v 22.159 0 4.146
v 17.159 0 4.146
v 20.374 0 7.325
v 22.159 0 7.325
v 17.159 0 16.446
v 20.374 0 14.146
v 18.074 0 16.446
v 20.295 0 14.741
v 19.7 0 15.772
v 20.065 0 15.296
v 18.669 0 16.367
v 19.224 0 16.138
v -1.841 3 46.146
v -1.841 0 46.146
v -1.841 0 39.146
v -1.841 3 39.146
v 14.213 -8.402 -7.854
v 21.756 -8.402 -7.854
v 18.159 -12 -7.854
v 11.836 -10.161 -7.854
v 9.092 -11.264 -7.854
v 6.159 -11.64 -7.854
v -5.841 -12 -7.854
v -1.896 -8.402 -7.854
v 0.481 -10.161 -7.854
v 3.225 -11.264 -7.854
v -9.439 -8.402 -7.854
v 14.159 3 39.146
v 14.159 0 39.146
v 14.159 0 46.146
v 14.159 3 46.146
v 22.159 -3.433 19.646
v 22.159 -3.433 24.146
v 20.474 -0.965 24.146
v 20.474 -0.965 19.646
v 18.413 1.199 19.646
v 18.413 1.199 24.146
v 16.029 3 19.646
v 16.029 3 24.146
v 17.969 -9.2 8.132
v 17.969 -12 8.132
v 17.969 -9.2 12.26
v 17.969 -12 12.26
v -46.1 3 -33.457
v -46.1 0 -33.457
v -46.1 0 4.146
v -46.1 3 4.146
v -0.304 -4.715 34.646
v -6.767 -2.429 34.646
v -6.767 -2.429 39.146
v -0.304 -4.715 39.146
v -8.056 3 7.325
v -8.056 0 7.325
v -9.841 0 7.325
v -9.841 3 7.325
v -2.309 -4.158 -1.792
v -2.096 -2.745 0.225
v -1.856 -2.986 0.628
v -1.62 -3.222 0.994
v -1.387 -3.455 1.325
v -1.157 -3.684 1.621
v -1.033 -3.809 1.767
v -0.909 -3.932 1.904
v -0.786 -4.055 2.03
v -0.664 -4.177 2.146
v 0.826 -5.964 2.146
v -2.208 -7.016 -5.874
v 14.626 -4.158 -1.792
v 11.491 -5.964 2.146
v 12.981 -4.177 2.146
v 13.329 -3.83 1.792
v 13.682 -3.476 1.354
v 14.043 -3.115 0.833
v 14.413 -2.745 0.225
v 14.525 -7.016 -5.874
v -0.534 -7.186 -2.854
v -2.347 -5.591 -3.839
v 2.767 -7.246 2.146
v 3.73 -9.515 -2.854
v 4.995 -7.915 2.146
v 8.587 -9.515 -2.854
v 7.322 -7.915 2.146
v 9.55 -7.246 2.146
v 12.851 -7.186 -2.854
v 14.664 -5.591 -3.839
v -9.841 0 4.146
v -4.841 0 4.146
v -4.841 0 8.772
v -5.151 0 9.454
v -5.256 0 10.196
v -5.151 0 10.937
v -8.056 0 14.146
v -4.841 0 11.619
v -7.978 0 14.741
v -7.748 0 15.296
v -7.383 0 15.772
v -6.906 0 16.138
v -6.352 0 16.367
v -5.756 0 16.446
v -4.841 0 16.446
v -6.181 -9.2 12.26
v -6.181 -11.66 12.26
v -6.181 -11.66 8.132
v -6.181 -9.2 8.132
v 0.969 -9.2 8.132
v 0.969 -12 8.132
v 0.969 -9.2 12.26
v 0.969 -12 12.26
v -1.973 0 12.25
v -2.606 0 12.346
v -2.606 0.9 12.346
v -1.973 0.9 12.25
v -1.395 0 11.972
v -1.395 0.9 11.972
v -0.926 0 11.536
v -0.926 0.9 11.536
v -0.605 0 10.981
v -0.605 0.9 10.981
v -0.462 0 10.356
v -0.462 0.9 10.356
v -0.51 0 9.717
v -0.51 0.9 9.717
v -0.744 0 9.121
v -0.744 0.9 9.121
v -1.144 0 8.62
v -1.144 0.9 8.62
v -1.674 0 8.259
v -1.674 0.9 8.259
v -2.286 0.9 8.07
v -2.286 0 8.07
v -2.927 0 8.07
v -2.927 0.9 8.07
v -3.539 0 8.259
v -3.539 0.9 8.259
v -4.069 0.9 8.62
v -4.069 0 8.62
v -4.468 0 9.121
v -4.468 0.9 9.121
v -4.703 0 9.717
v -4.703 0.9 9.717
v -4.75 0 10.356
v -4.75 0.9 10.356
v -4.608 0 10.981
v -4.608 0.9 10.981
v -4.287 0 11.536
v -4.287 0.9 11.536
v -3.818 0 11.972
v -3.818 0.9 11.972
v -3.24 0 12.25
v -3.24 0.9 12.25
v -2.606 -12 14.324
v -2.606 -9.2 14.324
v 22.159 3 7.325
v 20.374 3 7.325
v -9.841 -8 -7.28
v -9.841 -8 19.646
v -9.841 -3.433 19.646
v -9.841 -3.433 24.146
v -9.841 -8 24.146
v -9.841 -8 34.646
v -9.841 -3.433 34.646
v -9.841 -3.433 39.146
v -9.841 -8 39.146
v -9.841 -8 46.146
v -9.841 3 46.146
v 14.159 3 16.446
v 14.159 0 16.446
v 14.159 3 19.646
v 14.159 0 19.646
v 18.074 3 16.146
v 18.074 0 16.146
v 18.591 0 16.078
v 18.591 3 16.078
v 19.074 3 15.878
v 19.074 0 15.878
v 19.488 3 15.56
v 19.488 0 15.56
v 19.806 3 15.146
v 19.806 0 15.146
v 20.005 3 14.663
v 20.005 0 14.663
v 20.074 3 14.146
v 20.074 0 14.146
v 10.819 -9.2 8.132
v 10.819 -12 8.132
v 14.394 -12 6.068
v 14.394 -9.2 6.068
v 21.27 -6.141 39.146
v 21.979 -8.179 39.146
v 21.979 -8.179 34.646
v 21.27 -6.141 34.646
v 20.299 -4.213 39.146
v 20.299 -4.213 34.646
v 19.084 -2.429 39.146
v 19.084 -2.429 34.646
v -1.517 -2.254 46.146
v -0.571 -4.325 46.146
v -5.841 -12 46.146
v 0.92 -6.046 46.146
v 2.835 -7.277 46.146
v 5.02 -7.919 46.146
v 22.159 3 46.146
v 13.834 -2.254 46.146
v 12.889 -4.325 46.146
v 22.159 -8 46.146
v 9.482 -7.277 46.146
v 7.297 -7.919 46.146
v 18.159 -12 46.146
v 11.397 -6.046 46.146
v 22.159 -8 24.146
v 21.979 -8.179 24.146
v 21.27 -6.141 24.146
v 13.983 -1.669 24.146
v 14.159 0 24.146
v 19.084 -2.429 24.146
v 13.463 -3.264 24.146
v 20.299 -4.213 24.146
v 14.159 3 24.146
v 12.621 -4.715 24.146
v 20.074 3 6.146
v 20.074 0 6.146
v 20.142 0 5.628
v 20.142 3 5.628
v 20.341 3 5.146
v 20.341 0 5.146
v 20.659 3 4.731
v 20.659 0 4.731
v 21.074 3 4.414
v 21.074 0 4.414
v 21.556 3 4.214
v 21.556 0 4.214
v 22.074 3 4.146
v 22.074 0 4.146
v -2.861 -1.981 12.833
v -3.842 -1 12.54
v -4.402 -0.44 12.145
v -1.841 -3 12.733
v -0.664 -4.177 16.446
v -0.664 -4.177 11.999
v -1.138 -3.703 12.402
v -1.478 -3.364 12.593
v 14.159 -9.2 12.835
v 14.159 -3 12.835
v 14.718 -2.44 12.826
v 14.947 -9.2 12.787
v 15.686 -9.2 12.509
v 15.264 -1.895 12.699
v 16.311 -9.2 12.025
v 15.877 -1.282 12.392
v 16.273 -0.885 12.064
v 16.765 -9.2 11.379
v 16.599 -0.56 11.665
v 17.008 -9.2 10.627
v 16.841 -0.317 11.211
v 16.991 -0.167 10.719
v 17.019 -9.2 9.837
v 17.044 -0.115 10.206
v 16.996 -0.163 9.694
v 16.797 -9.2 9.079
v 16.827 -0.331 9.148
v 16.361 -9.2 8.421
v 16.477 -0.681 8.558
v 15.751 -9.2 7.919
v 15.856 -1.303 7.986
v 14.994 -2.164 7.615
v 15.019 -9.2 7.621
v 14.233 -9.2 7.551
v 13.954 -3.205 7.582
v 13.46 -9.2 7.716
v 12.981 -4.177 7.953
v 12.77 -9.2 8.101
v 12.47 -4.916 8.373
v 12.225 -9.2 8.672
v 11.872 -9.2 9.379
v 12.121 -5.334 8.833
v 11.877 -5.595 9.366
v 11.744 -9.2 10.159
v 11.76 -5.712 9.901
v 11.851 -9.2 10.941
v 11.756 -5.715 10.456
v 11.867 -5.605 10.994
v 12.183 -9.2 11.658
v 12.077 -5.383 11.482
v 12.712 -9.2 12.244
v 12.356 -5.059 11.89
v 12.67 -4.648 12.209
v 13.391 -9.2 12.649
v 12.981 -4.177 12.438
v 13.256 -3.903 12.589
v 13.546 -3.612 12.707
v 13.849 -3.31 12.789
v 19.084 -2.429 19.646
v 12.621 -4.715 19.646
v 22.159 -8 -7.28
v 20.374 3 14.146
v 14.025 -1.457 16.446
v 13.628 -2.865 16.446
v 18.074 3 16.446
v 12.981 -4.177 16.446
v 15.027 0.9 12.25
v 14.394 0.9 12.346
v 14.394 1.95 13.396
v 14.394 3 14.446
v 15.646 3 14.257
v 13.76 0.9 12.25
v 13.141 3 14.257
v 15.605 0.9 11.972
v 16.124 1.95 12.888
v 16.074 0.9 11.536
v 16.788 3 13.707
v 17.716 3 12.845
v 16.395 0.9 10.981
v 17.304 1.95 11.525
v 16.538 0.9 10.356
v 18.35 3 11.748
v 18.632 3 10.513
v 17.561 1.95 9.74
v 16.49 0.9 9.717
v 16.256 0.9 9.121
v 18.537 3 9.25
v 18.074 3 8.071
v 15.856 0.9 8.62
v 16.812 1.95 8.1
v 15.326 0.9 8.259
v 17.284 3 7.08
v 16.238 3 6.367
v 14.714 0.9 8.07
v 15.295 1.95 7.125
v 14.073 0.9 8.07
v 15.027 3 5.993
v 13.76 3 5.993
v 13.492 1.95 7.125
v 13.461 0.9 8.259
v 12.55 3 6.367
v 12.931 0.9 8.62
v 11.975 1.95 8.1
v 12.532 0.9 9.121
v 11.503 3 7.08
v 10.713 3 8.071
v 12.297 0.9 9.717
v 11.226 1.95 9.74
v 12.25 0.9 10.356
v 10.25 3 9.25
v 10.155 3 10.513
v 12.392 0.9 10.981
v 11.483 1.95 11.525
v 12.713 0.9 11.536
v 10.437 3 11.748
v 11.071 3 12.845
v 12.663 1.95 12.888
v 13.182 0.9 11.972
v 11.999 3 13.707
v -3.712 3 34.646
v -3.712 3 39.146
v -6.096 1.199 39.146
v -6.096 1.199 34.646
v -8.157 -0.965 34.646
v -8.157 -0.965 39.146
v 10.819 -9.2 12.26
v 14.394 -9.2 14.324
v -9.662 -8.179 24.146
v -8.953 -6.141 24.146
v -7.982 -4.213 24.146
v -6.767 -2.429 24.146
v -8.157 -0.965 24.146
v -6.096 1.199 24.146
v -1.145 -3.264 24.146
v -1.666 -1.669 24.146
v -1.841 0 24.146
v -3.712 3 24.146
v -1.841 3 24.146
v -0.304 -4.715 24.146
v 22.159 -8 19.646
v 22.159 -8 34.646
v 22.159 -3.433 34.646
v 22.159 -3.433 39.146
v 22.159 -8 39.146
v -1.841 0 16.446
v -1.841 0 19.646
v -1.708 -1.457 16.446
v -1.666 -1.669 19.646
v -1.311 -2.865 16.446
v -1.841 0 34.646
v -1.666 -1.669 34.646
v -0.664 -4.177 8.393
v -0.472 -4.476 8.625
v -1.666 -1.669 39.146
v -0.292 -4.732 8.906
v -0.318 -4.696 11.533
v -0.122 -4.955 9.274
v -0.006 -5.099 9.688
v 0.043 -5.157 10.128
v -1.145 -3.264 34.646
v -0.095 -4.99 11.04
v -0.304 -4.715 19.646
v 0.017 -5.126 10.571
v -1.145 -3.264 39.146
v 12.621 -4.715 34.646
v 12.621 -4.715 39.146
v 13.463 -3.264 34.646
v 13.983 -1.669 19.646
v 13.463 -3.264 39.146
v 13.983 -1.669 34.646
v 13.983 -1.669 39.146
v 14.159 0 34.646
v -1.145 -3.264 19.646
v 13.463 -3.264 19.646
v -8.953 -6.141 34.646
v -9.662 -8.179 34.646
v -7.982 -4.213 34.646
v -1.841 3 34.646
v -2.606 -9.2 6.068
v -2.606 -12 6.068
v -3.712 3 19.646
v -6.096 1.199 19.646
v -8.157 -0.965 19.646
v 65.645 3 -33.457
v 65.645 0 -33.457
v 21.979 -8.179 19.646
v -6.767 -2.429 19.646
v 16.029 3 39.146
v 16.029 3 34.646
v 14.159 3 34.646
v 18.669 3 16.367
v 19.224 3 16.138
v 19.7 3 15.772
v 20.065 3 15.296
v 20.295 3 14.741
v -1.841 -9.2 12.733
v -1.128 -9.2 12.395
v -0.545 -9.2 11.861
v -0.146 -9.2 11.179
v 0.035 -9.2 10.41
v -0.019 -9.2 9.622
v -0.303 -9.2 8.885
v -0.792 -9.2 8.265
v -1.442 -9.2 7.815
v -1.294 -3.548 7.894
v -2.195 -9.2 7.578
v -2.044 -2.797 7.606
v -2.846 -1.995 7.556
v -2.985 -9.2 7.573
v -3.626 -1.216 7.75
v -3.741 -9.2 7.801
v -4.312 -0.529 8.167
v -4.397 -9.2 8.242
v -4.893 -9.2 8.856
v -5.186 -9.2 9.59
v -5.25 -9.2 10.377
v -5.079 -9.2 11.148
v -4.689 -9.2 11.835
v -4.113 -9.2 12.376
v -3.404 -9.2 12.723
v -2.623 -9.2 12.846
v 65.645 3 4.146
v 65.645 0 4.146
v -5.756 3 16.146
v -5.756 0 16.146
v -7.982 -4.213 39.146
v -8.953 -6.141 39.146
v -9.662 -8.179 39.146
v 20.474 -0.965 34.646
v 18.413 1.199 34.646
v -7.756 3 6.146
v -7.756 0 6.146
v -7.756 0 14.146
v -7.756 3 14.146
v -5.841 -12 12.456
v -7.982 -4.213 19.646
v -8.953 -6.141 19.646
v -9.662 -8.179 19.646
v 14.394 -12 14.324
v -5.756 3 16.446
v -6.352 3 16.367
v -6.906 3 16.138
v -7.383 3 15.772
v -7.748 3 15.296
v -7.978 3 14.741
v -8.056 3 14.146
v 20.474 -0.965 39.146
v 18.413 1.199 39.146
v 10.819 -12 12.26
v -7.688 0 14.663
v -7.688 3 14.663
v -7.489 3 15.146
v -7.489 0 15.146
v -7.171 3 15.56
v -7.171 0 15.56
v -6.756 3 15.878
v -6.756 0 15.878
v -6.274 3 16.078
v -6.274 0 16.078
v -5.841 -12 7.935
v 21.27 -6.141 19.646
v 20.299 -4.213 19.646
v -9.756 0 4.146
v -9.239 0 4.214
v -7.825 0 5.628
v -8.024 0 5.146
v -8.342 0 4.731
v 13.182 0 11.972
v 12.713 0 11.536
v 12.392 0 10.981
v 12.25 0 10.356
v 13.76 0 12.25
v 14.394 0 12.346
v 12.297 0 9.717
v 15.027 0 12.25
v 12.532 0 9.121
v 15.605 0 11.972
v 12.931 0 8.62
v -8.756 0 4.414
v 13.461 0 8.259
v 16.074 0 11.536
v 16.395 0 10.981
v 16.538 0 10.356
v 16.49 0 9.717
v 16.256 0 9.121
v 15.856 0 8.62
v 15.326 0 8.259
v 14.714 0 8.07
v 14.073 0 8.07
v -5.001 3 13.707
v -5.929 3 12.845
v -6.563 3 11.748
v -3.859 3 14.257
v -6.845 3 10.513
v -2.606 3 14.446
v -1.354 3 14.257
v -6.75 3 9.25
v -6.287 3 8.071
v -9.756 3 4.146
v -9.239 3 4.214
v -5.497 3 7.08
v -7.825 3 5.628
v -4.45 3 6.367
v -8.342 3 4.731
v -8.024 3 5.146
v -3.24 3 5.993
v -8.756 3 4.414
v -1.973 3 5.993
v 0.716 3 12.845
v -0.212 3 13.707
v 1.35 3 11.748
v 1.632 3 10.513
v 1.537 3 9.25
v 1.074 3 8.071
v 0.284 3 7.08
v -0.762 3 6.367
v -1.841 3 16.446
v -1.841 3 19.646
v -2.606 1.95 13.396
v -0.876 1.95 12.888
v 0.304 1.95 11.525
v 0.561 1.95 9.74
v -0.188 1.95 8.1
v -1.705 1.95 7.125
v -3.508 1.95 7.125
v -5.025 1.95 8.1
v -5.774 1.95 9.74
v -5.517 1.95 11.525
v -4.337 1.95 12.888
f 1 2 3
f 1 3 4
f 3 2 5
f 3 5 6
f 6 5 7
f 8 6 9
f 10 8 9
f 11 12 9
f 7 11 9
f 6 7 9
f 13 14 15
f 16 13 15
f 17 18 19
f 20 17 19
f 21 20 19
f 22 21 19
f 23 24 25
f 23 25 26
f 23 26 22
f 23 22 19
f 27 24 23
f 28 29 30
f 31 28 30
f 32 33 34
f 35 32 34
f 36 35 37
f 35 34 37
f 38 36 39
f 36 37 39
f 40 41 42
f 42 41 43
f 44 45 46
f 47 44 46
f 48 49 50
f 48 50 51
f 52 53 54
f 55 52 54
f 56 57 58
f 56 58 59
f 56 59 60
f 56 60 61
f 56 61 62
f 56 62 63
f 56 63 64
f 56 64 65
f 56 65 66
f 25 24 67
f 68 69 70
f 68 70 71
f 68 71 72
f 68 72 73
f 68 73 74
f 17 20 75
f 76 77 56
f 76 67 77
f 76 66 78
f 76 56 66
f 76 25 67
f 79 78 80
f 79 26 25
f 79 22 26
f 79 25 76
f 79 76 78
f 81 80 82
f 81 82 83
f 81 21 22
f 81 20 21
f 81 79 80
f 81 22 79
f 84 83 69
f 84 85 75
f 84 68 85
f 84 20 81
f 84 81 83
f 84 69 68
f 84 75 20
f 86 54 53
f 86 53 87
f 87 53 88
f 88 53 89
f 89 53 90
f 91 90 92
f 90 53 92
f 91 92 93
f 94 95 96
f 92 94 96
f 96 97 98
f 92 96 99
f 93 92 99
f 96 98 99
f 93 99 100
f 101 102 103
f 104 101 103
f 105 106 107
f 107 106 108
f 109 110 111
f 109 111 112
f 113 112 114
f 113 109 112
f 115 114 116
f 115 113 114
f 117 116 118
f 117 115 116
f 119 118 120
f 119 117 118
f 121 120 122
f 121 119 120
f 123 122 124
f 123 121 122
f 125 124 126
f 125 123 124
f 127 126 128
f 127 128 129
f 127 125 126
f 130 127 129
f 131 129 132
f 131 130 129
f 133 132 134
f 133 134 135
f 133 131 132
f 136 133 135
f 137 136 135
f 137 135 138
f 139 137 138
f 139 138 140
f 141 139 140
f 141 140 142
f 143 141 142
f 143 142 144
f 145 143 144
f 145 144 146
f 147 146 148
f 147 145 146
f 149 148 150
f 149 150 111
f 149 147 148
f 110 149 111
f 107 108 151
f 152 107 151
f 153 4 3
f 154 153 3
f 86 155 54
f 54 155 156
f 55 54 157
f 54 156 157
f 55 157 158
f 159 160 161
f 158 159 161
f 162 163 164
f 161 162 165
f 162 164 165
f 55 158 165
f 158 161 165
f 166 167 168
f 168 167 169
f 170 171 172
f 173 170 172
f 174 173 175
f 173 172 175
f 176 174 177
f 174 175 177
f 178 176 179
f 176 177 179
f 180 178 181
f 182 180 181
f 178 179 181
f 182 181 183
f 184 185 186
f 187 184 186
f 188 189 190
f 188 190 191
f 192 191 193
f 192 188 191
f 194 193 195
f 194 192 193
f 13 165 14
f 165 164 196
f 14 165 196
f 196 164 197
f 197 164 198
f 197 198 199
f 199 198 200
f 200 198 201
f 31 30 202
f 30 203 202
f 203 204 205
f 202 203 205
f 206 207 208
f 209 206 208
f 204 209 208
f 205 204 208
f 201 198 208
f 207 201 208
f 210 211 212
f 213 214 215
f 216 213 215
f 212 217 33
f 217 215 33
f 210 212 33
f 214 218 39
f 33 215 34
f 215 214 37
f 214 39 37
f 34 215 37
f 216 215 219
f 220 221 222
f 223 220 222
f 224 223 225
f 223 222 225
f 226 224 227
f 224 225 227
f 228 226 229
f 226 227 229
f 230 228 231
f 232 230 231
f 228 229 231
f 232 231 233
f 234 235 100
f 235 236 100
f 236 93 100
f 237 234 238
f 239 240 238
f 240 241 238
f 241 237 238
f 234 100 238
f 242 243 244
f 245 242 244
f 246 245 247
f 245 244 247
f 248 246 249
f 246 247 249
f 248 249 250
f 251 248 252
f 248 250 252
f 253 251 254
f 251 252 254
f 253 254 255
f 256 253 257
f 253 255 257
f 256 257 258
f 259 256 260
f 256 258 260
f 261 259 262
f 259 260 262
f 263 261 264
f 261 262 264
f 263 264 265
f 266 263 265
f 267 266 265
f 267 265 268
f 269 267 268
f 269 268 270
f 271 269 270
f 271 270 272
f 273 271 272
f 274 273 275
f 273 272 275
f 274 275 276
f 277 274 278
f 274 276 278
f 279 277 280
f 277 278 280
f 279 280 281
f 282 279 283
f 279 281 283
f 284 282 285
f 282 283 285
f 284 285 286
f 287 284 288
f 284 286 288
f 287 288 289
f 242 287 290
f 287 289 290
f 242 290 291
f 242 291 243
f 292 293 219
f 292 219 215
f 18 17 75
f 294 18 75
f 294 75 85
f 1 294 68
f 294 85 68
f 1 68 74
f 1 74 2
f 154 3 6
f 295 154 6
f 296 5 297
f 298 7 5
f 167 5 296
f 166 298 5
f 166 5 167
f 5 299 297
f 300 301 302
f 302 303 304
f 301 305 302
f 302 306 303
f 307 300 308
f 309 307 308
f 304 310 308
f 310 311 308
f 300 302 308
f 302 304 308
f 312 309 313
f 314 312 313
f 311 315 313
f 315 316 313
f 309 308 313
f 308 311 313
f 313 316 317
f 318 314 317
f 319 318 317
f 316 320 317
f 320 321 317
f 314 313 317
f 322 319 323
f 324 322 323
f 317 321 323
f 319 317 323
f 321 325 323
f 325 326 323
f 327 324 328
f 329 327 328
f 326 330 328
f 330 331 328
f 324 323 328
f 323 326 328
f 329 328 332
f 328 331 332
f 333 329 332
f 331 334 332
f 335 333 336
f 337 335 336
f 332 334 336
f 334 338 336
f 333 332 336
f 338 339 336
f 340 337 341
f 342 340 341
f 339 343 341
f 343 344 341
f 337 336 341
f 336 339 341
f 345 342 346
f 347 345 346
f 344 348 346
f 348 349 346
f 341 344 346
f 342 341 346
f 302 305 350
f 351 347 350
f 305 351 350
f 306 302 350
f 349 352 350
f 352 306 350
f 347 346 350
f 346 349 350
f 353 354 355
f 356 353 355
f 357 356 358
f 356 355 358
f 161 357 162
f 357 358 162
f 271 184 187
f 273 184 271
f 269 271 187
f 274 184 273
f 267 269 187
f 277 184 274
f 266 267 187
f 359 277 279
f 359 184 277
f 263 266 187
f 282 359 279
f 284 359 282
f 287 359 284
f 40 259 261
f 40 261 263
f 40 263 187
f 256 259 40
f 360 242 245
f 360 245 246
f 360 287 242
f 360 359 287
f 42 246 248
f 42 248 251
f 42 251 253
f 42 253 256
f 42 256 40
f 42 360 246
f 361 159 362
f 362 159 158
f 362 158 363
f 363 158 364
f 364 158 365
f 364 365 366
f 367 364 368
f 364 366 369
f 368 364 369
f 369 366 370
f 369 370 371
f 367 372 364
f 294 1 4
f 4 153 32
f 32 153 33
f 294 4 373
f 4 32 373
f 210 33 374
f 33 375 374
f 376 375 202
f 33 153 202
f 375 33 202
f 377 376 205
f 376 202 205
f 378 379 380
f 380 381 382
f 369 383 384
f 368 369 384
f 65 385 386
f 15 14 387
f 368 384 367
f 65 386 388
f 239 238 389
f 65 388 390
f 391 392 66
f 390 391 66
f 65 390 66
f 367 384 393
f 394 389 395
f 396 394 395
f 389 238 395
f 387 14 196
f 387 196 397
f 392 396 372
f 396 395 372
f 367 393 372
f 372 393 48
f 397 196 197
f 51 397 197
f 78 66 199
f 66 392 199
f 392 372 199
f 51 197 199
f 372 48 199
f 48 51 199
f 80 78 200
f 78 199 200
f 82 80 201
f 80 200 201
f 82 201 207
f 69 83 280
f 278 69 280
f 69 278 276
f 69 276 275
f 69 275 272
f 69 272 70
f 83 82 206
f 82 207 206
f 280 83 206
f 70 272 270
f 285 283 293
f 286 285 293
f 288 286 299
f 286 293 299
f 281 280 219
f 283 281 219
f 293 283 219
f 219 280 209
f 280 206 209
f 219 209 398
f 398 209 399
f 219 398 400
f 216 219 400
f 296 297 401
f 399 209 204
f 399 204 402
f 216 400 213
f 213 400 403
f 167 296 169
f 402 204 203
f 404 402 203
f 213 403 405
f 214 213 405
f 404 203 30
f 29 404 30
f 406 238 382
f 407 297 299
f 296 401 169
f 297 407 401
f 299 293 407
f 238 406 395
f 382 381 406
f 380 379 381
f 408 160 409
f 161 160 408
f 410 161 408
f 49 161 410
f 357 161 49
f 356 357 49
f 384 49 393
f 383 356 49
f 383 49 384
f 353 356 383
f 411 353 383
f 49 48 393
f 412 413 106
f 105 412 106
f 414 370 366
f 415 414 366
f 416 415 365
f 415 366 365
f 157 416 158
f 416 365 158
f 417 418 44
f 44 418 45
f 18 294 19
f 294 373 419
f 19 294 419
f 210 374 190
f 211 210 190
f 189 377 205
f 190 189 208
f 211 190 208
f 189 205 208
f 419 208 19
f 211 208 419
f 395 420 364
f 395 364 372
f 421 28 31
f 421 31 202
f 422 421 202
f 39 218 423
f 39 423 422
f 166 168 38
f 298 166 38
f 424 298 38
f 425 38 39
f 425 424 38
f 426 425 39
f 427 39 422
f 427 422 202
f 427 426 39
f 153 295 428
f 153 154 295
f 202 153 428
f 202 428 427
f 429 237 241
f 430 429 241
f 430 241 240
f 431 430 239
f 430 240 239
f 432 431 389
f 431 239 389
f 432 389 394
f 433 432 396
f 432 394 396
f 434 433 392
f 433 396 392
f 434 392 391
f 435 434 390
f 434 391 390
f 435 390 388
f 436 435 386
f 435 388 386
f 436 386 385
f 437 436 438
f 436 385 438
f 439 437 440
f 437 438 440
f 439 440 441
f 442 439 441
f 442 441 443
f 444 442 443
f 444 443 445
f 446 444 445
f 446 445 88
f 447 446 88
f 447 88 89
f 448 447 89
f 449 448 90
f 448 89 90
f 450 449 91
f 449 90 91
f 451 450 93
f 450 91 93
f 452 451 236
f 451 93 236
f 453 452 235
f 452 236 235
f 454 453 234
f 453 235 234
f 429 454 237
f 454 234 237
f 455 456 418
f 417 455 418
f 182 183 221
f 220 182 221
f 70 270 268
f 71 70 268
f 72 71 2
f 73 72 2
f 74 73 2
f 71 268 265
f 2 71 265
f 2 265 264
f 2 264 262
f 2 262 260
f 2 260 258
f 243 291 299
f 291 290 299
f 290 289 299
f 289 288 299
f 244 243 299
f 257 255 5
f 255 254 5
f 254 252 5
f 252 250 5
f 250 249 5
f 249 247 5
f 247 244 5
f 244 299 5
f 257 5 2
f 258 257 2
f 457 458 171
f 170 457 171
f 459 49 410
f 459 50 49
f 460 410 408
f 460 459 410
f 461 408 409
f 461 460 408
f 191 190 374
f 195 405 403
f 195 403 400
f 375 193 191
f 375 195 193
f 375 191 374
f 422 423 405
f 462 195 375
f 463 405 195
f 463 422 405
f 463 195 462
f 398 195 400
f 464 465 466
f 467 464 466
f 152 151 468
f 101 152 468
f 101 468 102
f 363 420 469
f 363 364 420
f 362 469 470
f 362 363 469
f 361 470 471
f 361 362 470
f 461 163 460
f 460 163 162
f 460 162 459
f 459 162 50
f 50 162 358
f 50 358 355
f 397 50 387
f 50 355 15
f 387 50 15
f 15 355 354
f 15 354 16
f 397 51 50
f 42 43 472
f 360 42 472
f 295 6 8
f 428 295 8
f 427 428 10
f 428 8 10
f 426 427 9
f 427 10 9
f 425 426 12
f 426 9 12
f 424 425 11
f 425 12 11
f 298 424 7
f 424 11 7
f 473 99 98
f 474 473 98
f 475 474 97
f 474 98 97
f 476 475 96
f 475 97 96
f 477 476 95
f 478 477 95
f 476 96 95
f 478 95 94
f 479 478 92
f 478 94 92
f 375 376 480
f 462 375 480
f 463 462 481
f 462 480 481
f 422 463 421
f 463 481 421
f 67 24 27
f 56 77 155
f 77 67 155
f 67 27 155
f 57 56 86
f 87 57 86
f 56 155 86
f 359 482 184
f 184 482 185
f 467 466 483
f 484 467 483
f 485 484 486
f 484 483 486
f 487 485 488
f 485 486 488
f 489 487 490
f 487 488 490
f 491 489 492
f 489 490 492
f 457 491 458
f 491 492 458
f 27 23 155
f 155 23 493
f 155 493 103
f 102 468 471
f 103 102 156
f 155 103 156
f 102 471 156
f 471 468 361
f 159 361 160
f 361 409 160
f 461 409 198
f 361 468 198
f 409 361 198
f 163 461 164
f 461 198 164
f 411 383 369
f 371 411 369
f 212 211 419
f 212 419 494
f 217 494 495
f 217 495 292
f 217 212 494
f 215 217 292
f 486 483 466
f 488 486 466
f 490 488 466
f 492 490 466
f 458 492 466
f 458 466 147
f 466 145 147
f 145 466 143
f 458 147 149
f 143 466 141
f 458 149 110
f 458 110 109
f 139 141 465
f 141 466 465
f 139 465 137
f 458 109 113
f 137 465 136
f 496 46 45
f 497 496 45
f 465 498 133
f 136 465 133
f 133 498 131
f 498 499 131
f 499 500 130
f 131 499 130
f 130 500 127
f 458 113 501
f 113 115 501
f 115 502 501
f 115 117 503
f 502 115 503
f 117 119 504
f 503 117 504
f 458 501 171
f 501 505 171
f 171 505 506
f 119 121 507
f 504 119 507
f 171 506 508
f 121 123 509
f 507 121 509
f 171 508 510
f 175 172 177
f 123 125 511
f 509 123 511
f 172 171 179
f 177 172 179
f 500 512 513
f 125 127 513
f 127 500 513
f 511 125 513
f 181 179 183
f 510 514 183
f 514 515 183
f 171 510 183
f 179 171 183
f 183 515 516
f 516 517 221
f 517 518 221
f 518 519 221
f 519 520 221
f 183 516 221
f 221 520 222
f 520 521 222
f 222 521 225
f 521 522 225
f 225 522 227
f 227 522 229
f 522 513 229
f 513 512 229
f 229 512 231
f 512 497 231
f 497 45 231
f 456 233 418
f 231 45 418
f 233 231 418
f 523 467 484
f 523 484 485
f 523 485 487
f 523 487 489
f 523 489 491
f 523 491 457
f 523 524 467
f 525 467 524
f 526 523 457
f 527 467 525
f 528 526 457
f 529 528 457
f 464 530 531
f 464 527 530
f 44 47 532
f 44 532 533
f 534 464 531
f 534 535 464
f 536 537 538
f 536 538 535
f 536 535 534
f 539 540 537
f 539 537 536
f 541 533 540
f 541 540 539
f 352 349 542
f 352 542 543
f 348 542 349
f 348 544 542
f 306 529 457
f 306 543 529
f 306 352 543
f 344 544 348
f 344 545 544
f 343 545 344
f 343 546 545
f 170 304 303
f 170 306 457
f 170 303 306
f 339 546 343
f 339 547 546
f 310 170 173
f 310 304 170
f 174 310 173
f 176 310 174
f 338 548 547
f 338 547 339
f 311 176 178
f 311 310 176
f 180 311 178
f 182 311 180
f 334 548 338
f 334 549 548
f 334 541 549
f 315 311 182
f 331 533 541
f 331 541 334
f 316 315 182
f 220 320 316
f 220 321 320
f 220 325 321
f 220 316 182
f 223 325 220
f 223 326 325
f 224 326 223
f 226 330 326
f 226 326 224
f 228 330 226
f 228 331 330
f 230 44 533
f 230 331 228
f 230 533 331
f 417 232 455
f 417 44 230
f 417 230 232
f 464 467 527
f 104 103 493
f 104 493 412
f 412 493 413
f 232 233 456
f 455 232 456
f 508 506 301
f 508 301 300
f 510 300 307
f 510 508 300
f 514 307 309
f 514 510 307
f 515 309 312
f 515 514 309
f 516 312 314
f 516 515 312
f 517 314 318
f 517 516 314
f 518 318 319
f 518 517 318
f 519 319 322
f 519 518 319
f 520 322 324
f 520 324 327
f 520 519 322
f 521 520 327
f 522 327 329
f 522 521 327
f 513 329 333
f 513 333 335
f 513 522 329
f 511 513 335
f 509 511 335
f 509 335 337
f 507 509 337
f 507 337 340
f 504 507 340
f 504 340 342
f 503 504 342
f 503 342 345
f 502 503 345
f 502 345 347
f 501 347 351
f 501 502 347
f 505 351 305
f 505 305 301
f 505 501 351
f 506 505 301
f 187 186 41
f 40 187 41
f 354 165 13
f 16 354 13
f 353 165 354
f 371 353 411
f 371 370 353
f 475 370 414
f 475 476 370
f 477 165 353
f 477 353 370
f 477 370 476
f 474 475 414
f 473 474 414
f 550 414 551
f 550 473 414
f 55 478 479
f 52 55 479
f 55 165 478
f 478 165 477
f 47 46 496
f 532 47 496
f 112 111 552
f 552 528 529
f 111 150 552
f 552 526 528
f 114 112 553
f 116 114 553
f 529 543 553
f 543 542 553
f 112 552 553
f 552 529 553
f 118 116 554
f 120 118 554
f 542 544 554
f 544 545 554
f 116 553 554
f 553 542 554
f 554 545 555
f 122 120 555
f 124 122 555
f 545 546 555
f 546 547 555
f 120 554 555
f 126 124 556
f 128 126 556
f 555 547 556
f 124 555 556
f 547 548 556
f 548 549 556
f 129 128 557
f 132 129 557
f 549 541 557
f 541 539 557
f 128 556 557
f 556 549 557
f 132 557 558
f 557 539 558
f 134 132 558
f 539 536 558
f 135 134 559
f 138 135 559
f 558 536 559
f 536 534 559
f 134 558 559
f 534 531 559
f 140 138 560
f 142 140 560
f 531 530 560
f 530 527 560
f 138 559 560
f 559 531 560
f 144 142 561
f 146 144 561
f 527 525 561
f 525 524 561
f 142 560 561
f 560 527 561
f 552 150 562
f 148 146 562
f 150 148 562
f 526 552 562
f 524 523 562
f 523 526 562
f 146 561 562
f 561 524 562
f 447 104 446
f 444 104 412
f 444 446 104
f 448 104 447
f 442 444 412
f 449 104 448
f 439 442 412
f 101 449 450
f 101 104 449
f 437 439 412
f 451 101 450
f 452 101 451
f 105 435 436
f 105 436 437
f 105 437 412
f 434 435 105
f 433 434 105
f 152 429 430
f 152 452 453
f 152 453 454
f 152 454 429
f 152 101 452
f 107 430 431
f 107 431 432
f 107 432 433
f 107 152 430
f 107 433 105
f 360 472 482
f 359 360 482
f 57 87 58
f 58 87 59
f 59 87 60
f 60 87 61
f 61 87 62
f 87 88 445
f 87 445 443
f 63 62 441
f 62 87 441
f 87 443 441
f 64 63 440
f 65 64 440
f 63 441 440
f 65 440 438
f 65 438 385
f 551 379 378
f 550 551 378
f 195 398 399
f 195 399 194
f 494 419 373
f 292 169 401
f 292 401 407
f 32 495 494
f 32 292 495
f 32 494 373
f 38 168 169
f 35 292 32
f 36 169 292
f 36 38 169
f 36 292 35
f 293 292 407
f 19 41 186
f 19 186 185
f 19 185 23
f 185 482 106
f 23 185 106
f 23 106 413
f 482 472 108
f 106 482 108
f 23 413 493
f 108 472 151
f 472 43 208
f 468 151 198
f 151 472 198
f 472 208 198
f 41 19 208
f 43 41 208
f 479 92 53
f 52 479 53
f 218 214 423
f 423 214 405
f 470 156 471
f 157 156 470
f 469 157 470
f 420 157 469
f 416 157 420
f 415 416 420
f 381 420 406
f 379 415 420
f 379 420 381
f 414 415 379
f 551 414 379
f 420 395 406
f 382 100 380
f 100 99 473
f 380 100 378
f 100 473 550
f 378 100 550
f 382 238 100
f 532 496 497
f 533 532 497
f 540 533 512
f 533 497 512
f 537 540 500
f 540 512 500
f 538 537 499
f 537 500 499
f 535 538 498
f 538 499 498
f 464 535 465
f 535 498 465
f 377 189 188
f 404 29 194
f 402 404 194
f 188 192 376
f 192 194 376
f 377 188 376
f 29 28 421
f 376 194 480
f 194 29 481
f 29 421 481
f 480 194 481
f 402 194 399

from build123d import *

# Parameters (mm, degrees)
SKETCH1_R                = 2.15
BOSS_EXTRUDE1_DEPTH      = 3
CHAMFER1_SIZE            = 2.1
BOSS_EXTRUDE3_DEPTH      = 30
BOSS_EXTRUDE3_DEPTH_BACK = 12
SKETCH4_R                = 2.65
CUT_EXTRUDE1_DEPTH       = 25
CUT_EXTRUDE2_DEPTH       = 2.8
BOSS_EXTRUDE4_DEPTH      = 3
BOSS_EXTRUDE5_DEPTH      = 12
CHAMFER3_SIZE            = 10
CHAMFER3_SIZE2           = 3.639702343
CUT_EXTRUDE_THIN1_START  = -7
SKETCH9_R                = 18.410976788
SKETCH9_R_2              = 16.410976788
CUT_EXTRUDE_THIN1_DEPTH  = 4.5
CHAMFER4_START           = 34.645648855
CHAMFER4_DEPTH           = 4.5
CUT_EXTRUDE_THIN2_START  = -22
SKETCH9_2_R              = 18.410976788
SKETCH9_2_R_2            = 16.410976788
CUT_EXTRUDE_THIN2_DEPTH  = 4.5
CHAMFER5_START           = 19.645648855
CHAMFER5_DEPTH           = 4.5
CHAMFER6_SIZE            = 8.402490459
CHAMFER6_SIZE_2          = 12
CHAMFER7_SIZE            = 3


with BuildPart() as part:
    # Sketch1 → Boss-Extrude1 (new body)
    with BuildSketch(Plane(origin=(0, 0, 0), x_dir=(1, 0, 0), z_dir=(0, 1, 0))):
        with BuildLine():
            Line((22.073549618, -4.145648855), (65.64480916, -4.145648855))
            Line((65.64480916, -4.145648855), (65.64480916, 33.456717557))
            Line((65.64480916, 33.456717557), (-46.100076336, 33.456717557))
            Line((-46.100076336, 33.456717557), (-46.100076336, -4.145648855))
            Line((-46.100076336, -4.145648855), (-9.756450382, -4.145648855))
            ThreePointArc((-9.756450382, -4.145648855), (-8.342236819, -4.731435293), (-7.756450382, -6.145648855))
            Line((-7.756450382, -6.145648855), (-7.756450382, -14.145648855))
            ThreePointArc((-7.756450382, -14.145648855), (-7.170663944, -15.559862417), (-5.756450382, -16.145648855))
            Line((-5.756450382, -16.145648855), (18.073549618, -16.145648855))
            ThreePointArc((18.073549618, -16.145648855), (19.487763181, -15.559862417), (20.073549618, -14.145648855))
            Line((20.073549618, -14.145648855), (20.073549618, -6.145648855))
            ThreePointArc((20.073549618, -6.145648855), (20.659336056, -4.731435293), (22.073549618, -4.145648855))
        make_face()
        with Locations(Location((14.393549618, -10.195648855, 0), (0, 0, 270))):
            Circle(SKETCH1_R, mode=Mode.SUBTRACT)
        with Locations(Location((-2.606450382, -10.195648855, 0), (0, 0, 270))):
            Circle(SKETCH1_R, mode=Mode.SUBTRACT)
    extrude(amount=BOSS_EXTRUDE1_DEPTH)

    # Chamfer1
    chamfer1_edges = [part.edges().sort_by_distance(p)[0] for p in [
        (14.393549618, 3, 8.045648855),
        (-2.606450382, 3, 8.045648855),
    ]]
    chamfer(chamfer1_edges, length=CHAMFER1_SIZE)


with BuildPart() as body_2:
    # Sketch3 → Boss-Extrude3 (new, two sides: drawn at the far end of the back side and taken through both)
    with BuildSketch(Plane.XY.offset(16.145648855).offset(-BOSS_EXTRUDE3_DEPTH_BACK)):
        with BuildLine():
            Line((-9.841450382, 0), (-1.841450382, 0))
            ThreePointArc((-1.841450382, 0), (6.158549618, -8), (14.158549618, 0))
            Line((14.158549618, 0), (22.158549618, 0))
            Line((22.158549618, 0), (22.158549618, -8))
            Line((22.158549618, -8), (18.158549618, -12))
            Line((18.158549618, -12), (-5.841450382, -12))
            Line((-5.841450382, -12), (-9.841450382, -8))
            Line((-9.841450382, -8), (-9.841450382, 0))
        make_face()
    extrude(amount=BOSS_EXTRUDE3_DEPTH + BOSS_EXTRUDE3_DEPTH_BACK)

    # Sketch4 → Cut-Extrude1 (cut)
    with BuildSketch(Plane(origin=(0, 0, 0), x_dir=(1, 0, 0), z_dir=(0, 1, 0))):
        with Locations(Location((14.393549618, -10.195648855, 0), (0, 0, 264.912370403))):
            Circle(SKETCH4_R)
        with Locations(Location((-2.606450382, -10.195648855, 0), (0, 0, 286.778900879))):
            Circle(SKETCH4_R)
    extrude(amount=-CUT_EXTRUDE1_DEPTH, mode=Mode.SUBTRACT)

    # Sketch5 → Cut-Extrude2 (cut)
    with BuildSketch(Plane.XZ.offset(12)):
        Polygon((14.393549618, 14.32370328), (10.818549618, 12.259676067), (10.818549618, 8.131621643), (14.393549618, 6.06759443), (17.968549618, 8.131621643), (17.968549618, 12.259676067), align=None)
        Polygon((-2.606450382, 14.32370328), (-6.181450382, 12.259676067), (-6.181450382, 8.131621643), (-2.606450382, 6.06759443), (0.968549618, 8.131621643), (0.968549618, 12.259676067), align=None)
    extrude(amount=-CUT_EXTRUDE2_DEPTH, mode=Mode.SUBTRACT)

    # Sketch6 → Boss-Extrude4 (add)
    with BuildSketch(Plane(origin=(0, 0, 0), x_dir=(1, 0, 0), z_dir=(0, 1, 0))):
        with BuildLine():
            Line((14.158549618, -16.445648855), (14.158549618, -46.145648855))
            Line((14.158549618, -46.145648855), (22.158549618, -46.145648855))
            Line((22.158549618, -46.145648855), (22.158549618, -7.32451012))
            Line((22.158549618, -7.32451012), (20.373549618, -7.32451012))
            Line((20.373549618, -7.32451012), (20.373549618, -14.145648855))
            ThreePointArc((20.373549618, -14.145648855), (19.699895215, -15.771994452), (18.073549618, -16.445648855))
            Line((18.073549618, -16.445648855), (14.158549618, -16.445648855))
        make_face()
        with BuildLine():
            Line((-9.841450382, -7.32451012), (-9.841450382, -46.145648855))
            Line((-9.841450382, -46.145648855), (-1.841450382, -46.145648855))
            Line((-1.841450382, -46.145648855), (-1.841450382, -16.445648855))
            Line((-1.841450382, -16.445648855), (-5.756450382, -16.445648855))
            ThreePointArc((-5.756450382, -16.445648855), (-7.382795978, -15.771994452), (-8.056450382, -14.145648855))
            Line((-8.056450382, -14.145648855), (-8.056450382, -7.32451012))
            Line((-8.056450382, -7.32451012), (-9.841450382, -7.32451012))
        make_face()
    extrude(amount=BOSS_EXTRUDE4_DEPTH)

    # Sketch7 → Boss-Extrude5 (add)
    with BuildSketch(Plane(origin=(0, 0, 4.145648855), x_dir=(-1, 0, 0), z_dir=(0, 0, -1))):
        with BuildLine():
            Line((9.841450382, -8), (9.841450382, 0))
            Line((9.841450382, 0), (1.841450382, 0))
            ThreePointArc((1.841450382, 0), (-6.158549618, -8), (-14.158549618, 0))
            Line((-14.158549618, 0), (-22.158549618, 0))
            Line((-22.158549618, 0), (-22.158549618, -8))
            Line((-22.158549618, -8), (-18.158549618, -12))
            Line((-18.158549618, -12), (5.841450382, -12))
            Line((5.841450382, -12), (9.841450382, -8))
        make_face()
    extrude(amount=BOSS_EXTRUDE5_DEPTH)

    # Chamfer3
    chamfer3_edges = [body_2.edges().sort_by_distance(p)[0] for p in [
        (6.158549618, -8, -7.854351145),
    ]]
    chamfer3_side = [body_2.faces().sort_by_distance(p)[0] for p in [
        (6.158549618, -8, 19.145648855),
    ]]
    chamfer(chamfer3_edges, length=CHAMFER3_SIZE, length2=CHAMFER3_SIZE2, reference=chamfer3_side[0])

    # Sketch9 → Cut-Extrude-Thin1 (cut)
    with BuildSketch(Plane.XY.offset(46.145648855).offset(CUT_EXTRUDE_THIN1_START)):
        with Locations((6.158549618, -12.541232702)):
            Circle(SKETCH9_R)
        with Locations((6.158549618, -12.541232702)):
            Circle(SKETCH9_R_2, mode=Mode.SUBTRACT)
    extrude(amount=-CUT_EXTRUDE_THIN1_DEPTH, mode=Mode.SUBTRACT)

    # Chamfer4: read off the stored shape, not the designer's step
    # Chamfer4 outline → Chamfer4 (cut)
    with BuildSketch(Plane.XY.offset(CHAMFER4_START)):
        with BuildLine():
            Line((-6.766645452, -2.428889178), (-0.304047917, -4.715382603))
            ThreePointArc((-0.304047917, -4.715382603), (-1.447394777, -2.479840692), (-1.841450382, 0))
            Line((-1.841450382, 0), (-1.841450382, 1.787764442))
            ThreePointArc((-1.841450382, 1.787764442), (-4.514359504, -0.07491127), (-6.766645452, -2.428889178))
        make_face()
        with BuildLine():
            ThreePointArc((14.158549618, 0), (13.764494013, -2.479840692), (12.621147154, -4.715382603))
            Line((12.621147154, -4.715382603), (19.083744689, -2.428889178))
            ThreePointArc((19.083744689, -2.428889178), (16.83145874, -0.074911271), (14.158549618, 1.787764442))
            Line((14.158549618, 1.787764442), (14.158549618, 0))
        make_face()
    extrude(amount=CHAMFER4_DEPTH, mode=Mode.SUBTRACT)

    # Sketch9<2> → Cut-Extrude-Thin2 (cut)
    with BuildSketch(Plane.XY.offset(46.145648855).offset(CUT_EXTRUDE_THIN2_START)):
        with Locations((6.158549618, -12.541232702)):
            Circle(SKETCH9_2_R)
        with Locations((6.158549618, -12.541232702)):
            Circle(SKETCH9_2_R_2, mode=Mode.SUBTRACT)
    extrude(amount=-CUT_EXTRUDE_THIN2_DEPTH, mode=Mode.SUBTRACT)

    # Chamfer5: read off the stored shape, not the designer's step
    # Chamfer5 outline → Chamfer5 (cut)
    with BuildSketch(Plane.XY.offset(CHAMFER5_START)):
        with BuildLine():
            Line((-6.766645452, -2.428889178), (-0.304047917, -4.715382603))
            ThreePointArc((-0.304047917, -4.715382603), (-1.447394777, -2.479840692), (-1.841450382, 0))
            Line((-1.841450382, 0), (-1.841450382, 1.787764442))
            ThreePointArc((-1.841450382, 1.787764442), (-4.514359504, -0.07491127), (-6.766645452, -2.428889178))
        make_face()
        with BuildLine():
            ThreePointArc((14.158549618, 0), (13.764494013, -2.479840692), (12.621147154, -4.715382603))
            Line((12.621147154, -4.715382603), (19.083744689, -2.428889178))
            ThreePointArc((19.083744689, -2.428889178), (16.83145874, -0.074911271), (14.158549618, 1.787764442))
            Line((14.158549618, 1.787764442), (14.158549618, 0))
        make_face()
    extrude(amount=CHAMFER5_DEPTH, mode=Mode.SUBTRACT)

    # Chamfer6
    # the kernel refuses this chamfer: 12, 8.402490459 mm, written as the material it takes off along each edge
    with BuildSketch(Plane(origin=(-13.192374802, 0, -7.854351145), x_dir=(0, -1, 0), z_dir=(1, 0, 0))) as chamfer6_piece_1:
        Polygon((CHAMFER6_SIZE, 0), (0, -CHAMFER6_SIZE_2), (0, 0), align=None)
    extrude(amount=66.341551184, mode=Mode.SUBTRACT)
    with BuildSketch(Plane(origin=(-40.832077145, 0, -7.854351145), x_dir=(0, 0, 1), z_dir=(1, 0, 0))) as chamfer6_piece_2:
        Polygon((CHAMFER6_SIZE_2, 0), (0, CHAMFER6_SIZE), (0, 0), align=None)
    extrude(amount=66.341551184, mode=Mode.SUBTRACT)

    # Chamfer7
    # the kernel refuses this chamfer: 3 mm, written as the material it takes off along each edge
    with BuildSketch(Plane(origin=(-1.841450382, 0, 16.445648855), x_dir=(-1, 0, 0), z_dir=(0, 0, -1))) as chamfer7_piece_1:
        with BuildLine():
            Line((CHAMFER7_SIZE, 0), (-1.177124344, -4.177124344))
            ThreePointArc((-1.177124344, -4.177124344), (-0.314888309, -2.222399221), (0, 0))
            Line((0, 0), (CHAMFER7_SIZE, 0))
        make_face()
    extrude(amount=14.825043224, mode=Mode.SUBTRACT)
    with BuildSketch(Plane(origin=(-1.841450382, 0, 18.770692079), x_dir=(-1, 0, 0), z_dir=(0, 0, -1))) as chamfer7_piece_2_section:
        with BuildLine():
            Line((CHAMFER7_SIZE, 0), (-1.177124344, -4.177124344))
            ThreePointArc((-1.177124344, -4.177124344), (-0.314888309, -2.222399221), (0, 0))
            Line((0, 0), (CHAMFER7_SIZE, 0))
        make_face()
    chamfer7_piece_2 = extrude(amount=25.737264999, mode=Mode.PRIVATE)
    chamfer7_piece_2 = split(chamfer7_piece_2, bisect_by=Plane(origin=(-1.841450382, 0, 16.445648855), z_dir=(0, 0, -1)), keep=Keep.TOP, mode=Mode.PRIVATE)
    add(chamfer7_piece_2, mode=Mode.SUBTRACT)
    with BuildSketch(Plane(origin=(14.158549618, 0, 18.668311008), x_dir=(-0.2712384034926293, -0.9625121965309165, 0), z_dir=(0, 0, -1))) as chamfer7_piece_3_section:
        with BuildLine():
            Line((4.339814456, 0), (-CHAMFER7_SIZE * 0.271238403493, -CHAMFER7_SIZE * 0.962512196531))
            Line((-CHAMFER7_SIZE * 0.271238403493, -CHAMFER7_SIZE * 0.962512196531), (0, 0))
            ThreePointArc((0, 0), (2.224496158, -0.299716179), (4.339814456, 0))
        make_face()
    chamfer7_piece_3 = extrude(amount=25.634883928, mode=Mode.PRIVATE)
    chamfer7_piece_3 = split(chamfer7_piece_3, bisect_by=Plane(origin=(14.158549618, 0, 16.445648855), z_dir=(0, 0, -1)), keep=Keep.TOP, mode=Mode.PRIVATE)
    add(chamfer7_piece_3, mode=Mode.SUBTRACT)


solid = Compound([part.part, body_2.part])
